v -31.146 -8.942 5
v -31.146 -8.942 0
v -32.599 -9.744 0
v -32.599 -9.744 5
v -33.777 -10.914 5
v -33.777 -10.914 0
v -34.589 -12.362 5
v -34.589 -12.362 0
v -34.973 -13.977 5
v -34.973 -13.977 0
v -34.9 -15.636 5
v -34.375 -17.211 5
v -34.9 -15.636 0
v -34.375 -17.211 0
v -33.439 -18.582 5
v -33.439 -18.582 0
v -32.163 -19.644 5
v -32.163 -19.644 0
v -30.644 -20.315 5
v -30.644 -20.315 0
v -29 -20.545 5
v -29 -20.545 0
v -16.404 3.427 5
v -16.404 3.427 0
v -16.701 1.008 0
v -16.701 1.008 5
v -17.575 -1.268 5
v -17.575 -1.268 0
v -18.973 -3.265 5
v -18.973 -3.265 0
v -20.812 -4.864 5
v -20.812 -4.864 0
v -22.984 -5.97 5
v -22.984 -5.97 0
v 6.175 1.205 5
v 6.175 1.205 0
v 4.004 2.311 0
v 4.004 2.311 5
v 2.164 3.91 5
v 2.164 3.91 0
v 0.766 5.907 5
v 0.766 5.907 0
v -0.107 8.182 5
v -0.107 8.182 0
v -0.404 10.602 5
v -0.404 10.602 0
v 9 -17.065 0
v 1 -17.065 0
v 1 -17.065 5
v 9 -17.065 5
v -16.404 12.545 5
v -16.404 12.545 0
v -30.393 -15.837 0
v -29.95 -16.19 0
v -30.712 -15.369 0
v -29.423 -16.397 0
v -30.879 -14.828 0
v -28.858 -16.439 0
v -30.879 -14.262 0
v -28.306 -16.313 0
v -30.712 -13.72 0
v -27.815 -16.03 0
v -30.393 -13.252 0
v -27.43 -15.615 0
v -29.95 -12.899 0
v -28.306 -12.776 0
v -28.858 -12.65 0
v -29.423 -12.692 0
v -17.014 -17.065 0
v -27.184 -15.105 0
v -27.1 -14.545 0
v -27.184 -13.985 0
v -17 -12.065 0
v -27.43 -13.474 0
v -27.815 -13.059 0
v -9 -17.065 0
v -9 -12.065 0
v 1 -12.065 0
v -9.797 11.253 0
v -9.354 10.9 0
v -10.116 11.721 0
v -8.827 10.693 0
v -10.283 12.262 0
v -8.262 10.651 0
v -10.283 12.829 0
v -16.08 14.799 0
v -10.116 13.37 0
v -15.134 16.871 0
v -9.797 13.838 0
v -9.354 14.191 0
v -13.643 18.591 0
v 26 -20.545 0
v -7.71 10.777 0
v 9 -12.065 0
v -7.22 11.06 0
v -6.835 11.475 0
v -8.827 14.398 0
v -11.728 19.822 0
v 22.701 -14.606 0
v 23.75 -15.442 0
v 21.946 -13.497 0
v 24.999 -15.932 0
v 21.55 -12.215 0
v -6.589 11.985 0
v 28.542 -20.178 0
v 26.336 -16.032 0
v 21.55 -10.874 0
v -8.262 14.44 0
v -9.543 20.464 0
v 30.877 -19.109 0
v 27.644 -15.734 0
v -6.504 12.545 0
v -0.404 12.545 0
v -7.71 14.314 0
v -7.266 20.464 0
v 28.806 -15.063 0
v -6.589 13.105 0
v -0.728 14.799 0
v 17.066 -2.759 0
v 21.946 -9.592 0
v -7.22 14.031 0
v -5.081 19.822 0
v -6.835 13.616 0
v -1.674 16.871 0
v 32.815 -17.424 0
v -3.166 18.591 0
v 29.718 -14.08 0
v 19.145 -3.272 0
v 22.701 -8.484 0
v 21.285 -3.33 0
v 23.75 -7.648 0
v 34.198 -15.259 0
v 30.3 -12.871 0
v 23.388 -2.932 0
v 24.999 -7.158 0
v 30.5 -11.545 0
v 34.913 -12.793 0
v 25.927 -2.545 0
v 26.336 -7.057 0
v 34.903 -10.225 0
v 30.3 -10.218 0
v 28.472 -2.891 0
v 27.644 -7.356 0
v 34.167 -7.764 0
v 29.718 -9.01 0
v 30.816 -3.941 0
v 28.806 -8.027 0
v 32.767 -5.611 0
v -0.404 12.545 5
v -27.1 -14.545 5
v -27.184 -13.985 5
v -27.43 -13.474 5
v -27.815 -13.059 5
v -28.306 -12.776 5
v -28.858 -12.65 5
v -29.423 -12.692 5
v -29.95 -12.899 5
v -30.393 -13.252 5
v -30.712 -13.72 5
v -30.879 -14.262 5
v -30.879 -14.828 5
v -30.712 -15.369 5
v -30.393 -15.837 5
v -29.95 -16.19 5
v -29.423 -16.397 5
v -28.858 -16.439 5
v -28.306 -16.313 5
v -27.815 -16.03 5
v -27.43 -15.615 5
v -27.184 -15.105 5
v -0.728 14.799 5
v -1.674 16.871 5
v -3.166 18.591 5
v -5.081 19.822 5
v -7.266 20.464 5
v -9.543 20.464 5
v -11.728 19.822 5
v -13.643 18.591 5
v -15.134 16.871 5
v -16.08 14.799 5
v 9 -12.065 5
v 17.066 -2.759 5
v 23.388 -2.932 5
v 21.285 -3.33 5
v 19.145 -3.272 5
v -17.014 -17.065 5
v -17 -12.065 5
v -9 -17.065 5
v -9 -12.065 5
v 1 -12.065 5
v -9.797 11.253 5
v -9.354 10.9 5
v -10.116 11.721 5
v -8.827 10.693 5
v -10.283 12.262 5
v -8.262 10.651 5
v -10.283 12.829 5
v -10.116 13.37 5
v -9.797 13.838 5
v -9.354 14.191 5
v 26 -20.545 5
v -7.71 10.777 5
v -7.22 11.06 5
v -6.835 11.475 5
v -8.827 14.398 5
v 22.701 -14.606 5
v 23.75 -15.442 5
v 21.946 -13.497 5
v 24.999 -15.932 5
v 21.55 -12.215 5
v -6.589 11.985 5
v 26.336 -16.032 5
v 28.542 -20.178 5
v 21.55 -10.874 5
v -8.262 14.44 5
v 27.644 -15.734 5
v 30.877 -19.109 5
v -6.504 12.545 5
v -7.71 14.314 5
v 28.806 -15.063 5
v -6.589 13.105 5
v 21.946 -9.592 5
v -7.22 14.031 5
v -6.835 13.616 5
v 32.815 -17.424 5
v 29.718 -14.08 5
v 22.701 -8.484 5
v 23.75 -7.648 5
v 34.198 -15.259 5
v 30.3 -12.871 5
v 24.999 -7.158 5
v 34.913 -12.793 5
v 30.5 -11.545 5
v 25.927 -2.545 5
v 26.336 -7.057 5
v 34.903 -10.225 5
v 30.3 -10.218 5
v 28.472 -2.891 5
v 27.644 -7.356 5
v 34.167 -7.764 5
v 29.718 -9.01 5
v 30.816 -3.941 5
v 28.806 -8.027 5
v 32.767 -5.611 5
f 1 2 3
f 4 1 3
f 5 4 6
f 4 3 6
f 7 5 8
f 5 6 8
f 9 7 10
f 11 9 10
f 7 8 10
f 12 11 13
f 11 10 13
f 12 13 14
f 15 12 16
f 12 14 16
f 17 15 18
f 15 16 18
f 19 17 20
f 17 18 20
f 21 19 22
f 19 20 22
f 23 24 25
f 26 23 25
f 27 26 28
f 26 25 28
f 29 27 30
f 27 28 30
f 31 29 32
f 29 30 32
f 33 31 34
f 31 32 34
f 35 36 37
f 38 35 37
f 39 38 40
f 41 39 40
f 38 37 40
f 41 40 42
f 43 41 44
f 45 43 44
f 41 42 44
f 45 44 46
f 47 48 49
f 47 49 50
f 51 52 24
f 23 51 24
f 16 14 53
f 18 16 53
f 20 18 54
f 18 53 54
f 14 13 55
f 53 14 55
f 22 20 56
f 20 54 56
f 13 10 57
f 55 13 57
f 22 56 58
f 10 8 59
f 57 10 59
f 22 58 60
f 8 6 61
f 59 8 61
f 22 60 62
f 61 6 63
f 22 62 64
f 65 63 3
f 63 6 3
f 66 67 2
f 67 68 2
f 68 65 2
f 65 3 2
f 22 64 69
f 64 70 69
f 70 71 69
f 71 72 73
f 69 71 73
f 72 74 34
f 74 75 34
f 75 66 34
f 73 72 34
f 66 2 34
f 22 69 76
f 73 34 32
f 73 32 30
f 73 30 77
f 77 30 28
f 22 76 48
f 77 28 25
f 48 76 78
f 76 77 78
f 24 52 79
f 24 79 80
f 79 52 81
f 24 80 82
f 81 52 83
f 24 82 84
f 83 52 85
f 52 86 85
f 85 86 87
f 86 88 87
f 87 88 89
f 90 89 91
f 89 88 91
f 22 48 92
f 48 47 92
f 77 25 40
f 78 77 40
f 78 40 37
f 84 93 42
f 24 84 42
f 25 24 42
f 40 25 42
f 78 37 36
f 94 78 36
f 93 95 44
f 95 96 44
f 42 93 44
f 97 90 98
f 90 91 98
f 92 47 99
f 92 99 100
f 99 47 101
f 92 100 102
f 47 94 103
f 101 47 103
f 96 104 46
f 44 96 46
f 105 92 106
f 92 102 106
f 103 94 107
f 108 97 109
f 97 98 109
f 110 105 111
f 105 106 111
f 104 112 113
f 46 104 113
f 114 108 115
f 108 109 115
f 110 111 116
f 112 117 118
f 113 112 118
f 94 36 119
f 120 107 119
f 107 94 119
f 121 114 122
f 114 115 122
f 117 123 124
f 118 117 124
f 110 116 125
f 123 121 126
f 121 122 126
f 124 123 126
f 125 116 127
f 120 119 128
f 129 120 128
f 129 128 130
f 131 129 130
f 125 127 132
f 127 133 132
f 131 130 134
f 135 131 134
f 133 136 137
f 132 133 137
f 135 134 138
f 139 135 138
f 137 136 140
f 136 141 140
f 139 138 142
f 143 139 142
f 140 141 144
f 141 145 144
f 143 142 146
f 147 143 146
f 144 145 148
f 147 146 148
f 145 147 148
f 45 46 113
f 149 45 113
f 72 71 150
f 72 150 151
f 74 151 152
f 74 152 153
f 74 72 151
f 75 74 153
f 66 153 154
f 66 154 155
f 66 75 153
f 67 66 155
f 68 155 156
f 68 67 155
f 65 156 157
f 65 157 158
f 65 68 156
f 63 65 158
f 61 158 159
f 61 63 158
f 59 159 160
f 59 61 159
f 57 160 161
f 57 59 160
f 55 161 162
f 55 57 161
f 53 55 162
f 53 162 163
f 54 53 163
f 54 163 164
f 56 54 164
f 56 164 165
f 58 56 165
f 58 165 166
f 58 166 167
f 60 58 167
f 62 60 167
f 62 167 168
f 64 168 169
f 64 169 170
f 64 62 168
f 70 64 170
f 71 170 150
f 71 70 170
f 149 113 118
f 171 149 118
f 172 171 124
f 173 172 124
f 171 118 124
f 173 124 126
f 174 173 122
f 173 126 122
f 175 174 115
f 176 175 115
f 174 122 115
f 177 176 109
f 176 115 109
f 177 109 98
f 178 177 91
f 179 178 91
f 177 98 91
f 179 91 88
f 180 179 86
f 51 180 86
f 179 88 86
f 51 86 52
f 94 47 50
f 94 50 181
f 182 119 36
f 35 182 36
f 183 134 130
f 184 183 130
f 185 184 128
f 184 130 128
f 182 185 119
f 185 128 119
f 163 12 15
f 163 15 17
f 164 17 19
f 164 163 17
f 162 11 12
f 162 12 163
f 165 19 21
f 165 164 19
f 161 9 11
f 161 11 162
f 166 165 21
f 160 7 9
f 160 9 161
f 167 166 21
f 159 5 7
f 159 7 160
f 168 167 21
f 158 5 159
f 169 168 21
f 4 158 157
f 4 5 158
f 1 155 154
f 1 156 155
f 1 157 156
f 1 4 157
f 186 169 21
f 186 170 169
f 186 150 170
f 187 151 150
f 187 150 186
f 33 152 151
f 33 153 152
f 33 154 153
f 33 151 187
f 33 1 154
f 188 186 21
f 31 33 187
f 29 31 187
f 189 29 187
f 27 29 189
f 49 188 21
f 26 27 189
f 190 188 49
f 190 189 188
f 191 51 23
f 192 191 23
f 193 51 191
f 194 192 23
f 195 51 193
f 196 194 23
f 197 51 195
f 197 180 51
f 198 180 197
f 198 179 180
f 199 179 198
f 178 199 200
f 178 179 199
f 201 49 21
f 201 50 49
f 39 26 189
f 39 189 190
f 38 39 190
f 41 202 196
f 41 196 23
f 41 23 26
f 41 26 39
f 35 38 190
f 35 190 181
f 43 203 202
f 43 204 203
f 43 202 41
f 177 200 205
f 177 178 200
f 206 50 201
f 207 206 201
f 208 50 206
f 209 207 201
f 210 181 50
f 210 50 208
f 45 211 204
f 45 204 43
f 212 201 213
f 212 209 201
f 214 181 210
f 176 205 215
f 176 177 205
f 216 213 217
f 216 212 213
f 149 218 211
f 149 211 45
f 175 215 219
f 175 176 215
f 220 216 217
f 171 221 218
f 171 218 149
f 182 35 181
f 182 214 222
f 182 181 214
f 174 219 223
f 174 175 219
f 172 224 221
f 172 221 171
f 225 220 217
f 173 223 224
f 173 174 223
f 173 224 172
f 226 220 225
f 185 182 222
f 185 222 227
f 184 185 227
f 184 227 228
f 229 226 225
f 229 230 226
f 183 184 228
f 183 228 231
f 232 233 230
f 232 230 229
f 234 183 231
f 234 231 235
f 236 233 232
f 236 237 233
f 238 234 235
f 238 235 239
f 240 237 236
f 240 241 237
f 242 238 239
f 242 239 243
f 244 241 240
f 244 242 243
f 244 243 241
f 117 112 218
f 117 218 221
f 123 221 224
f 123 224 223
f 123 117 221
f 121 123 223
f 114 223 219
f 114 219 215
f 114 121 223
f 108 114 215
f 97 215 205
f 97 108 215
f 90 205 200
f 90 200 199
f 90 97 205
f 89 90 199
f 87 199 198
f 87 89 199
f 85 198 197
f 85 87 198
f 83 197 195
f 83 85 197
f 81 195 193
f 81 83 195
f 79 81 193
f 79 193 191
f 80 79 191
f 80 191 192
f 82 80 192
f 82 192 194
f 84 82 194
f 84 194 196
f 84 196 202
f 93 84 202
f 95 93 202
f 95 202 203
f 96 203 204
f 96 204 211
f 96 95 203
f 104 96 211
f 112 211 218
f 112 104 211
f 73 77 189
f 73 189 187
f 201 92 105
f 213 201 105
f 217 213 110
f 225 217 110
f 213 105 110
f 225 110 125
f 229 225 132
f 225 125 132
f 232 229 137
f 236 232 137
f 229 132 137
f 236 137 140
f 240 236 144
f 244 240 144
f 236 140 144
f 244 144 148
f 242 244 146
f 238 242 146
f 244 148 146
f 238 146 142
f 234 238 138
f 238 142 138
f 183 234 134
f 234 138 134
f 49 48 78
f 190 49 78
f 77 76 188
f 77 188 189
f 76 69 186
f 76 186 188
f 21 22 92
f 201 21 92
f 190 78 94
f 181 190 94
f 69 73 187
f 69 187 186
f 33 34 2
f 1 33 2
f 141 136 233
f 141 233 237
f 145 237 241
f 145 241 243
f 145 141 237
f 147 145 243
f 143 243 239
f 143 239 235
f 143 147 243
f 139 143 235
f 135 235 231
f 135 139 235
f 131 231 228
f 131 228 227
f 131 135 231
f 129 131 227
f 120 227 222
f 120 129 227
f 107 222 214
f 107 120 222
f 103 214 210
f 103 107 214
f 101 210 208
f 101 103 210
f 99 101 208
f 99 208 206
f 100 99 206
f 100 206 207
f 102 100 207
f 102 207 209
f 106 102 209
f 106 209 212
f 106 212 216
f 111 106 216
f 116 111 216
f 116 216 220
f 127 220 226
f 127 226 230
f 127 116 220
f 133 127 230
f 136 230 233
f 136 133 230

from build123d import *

# Parameters (mm, degrees)
ESQUISSE1_R        = 1.9
ESQUISSE1_R_2      = 4.5
ESQUISSE1_W        = 8
ESQUISSE1_H        = 5
BOSS_EXTRU_1_DEPTH = 5


with BuildPart() as part:
    # Esquisse1 → Boss.-Extru.1 (new body)
    with BuildSketch(Plane.XY):
        with BuildLine():
            Line((-22.984184861, -5.970148314), (-31.145801552, -8.941620925))
            ThreePointArc((-31.145801552, -8.941620925), (-34.899958966, -15.635885981), (-29, -20.544792857))
            Line((-29, -20.544792857), (26, -20.544792857))
            ThreePointArc((26, -20.544792857), (34.902651948, -10.224645785), (23.388264466, -2.932079143))
            ThreePointArc((23.388264466, -2.932079143), (20.213182454, -3.358665896), (17.066134535, -2.7593234))
            Line((17.066134535, -2.7593234), (6.175413191, 1.204575468))
            ThreePointArc((6.175413191, 1.204575468), (1.404093414, 4.865736977), (-0.404386386, 10.601501853))
            Line((-0.404386386, 10.601501853), (-0.404386386, 12.54541747))
            ThreePointArc((-0.404386386, 12.54541747), (-8.404386386, 20.54541747), (-16.404387146, 12.54541747))
            Line((-16.404387146, 12.54541747), (-16.404387146, 3.426777584))
            ThreePointArc((-16.404387146, 3.426777584), (-18.212866443, -2.308986408), (-22.984184861, -5.970148314))
        make_face()
        with Locations((-8.404386386, 12.54541747)):
            Circle(ESQUISSE1_R, mode=Mode.SUBTRACT)
        with Locations((-29, -14.544792857)):
            Circle(ESQUISSE1_R, mode=Mode.SUBTRACT)
        with Locations((26, -11.544792857)):
            Circle(ESQUISSE1_R_2, mode=Mode.SUBTRACT)
        with Locations((4.999995852, -14.564792857)):
            Rectangle(ESQUISSE1_W, ESQUISSE1_H, mode=Mode.SUBTRACT)
        Polygon((-17.000004148, -12.064792857), (-17.013857883, -17.064792857), (-9.000004148, -17.064792857), (-9.000004148, -12.064792857), align=None, mode=Mode.SUBTRACT)
    extrude(amount=BOSS_EXTRU_1_DEPTH)


solid = part.part
